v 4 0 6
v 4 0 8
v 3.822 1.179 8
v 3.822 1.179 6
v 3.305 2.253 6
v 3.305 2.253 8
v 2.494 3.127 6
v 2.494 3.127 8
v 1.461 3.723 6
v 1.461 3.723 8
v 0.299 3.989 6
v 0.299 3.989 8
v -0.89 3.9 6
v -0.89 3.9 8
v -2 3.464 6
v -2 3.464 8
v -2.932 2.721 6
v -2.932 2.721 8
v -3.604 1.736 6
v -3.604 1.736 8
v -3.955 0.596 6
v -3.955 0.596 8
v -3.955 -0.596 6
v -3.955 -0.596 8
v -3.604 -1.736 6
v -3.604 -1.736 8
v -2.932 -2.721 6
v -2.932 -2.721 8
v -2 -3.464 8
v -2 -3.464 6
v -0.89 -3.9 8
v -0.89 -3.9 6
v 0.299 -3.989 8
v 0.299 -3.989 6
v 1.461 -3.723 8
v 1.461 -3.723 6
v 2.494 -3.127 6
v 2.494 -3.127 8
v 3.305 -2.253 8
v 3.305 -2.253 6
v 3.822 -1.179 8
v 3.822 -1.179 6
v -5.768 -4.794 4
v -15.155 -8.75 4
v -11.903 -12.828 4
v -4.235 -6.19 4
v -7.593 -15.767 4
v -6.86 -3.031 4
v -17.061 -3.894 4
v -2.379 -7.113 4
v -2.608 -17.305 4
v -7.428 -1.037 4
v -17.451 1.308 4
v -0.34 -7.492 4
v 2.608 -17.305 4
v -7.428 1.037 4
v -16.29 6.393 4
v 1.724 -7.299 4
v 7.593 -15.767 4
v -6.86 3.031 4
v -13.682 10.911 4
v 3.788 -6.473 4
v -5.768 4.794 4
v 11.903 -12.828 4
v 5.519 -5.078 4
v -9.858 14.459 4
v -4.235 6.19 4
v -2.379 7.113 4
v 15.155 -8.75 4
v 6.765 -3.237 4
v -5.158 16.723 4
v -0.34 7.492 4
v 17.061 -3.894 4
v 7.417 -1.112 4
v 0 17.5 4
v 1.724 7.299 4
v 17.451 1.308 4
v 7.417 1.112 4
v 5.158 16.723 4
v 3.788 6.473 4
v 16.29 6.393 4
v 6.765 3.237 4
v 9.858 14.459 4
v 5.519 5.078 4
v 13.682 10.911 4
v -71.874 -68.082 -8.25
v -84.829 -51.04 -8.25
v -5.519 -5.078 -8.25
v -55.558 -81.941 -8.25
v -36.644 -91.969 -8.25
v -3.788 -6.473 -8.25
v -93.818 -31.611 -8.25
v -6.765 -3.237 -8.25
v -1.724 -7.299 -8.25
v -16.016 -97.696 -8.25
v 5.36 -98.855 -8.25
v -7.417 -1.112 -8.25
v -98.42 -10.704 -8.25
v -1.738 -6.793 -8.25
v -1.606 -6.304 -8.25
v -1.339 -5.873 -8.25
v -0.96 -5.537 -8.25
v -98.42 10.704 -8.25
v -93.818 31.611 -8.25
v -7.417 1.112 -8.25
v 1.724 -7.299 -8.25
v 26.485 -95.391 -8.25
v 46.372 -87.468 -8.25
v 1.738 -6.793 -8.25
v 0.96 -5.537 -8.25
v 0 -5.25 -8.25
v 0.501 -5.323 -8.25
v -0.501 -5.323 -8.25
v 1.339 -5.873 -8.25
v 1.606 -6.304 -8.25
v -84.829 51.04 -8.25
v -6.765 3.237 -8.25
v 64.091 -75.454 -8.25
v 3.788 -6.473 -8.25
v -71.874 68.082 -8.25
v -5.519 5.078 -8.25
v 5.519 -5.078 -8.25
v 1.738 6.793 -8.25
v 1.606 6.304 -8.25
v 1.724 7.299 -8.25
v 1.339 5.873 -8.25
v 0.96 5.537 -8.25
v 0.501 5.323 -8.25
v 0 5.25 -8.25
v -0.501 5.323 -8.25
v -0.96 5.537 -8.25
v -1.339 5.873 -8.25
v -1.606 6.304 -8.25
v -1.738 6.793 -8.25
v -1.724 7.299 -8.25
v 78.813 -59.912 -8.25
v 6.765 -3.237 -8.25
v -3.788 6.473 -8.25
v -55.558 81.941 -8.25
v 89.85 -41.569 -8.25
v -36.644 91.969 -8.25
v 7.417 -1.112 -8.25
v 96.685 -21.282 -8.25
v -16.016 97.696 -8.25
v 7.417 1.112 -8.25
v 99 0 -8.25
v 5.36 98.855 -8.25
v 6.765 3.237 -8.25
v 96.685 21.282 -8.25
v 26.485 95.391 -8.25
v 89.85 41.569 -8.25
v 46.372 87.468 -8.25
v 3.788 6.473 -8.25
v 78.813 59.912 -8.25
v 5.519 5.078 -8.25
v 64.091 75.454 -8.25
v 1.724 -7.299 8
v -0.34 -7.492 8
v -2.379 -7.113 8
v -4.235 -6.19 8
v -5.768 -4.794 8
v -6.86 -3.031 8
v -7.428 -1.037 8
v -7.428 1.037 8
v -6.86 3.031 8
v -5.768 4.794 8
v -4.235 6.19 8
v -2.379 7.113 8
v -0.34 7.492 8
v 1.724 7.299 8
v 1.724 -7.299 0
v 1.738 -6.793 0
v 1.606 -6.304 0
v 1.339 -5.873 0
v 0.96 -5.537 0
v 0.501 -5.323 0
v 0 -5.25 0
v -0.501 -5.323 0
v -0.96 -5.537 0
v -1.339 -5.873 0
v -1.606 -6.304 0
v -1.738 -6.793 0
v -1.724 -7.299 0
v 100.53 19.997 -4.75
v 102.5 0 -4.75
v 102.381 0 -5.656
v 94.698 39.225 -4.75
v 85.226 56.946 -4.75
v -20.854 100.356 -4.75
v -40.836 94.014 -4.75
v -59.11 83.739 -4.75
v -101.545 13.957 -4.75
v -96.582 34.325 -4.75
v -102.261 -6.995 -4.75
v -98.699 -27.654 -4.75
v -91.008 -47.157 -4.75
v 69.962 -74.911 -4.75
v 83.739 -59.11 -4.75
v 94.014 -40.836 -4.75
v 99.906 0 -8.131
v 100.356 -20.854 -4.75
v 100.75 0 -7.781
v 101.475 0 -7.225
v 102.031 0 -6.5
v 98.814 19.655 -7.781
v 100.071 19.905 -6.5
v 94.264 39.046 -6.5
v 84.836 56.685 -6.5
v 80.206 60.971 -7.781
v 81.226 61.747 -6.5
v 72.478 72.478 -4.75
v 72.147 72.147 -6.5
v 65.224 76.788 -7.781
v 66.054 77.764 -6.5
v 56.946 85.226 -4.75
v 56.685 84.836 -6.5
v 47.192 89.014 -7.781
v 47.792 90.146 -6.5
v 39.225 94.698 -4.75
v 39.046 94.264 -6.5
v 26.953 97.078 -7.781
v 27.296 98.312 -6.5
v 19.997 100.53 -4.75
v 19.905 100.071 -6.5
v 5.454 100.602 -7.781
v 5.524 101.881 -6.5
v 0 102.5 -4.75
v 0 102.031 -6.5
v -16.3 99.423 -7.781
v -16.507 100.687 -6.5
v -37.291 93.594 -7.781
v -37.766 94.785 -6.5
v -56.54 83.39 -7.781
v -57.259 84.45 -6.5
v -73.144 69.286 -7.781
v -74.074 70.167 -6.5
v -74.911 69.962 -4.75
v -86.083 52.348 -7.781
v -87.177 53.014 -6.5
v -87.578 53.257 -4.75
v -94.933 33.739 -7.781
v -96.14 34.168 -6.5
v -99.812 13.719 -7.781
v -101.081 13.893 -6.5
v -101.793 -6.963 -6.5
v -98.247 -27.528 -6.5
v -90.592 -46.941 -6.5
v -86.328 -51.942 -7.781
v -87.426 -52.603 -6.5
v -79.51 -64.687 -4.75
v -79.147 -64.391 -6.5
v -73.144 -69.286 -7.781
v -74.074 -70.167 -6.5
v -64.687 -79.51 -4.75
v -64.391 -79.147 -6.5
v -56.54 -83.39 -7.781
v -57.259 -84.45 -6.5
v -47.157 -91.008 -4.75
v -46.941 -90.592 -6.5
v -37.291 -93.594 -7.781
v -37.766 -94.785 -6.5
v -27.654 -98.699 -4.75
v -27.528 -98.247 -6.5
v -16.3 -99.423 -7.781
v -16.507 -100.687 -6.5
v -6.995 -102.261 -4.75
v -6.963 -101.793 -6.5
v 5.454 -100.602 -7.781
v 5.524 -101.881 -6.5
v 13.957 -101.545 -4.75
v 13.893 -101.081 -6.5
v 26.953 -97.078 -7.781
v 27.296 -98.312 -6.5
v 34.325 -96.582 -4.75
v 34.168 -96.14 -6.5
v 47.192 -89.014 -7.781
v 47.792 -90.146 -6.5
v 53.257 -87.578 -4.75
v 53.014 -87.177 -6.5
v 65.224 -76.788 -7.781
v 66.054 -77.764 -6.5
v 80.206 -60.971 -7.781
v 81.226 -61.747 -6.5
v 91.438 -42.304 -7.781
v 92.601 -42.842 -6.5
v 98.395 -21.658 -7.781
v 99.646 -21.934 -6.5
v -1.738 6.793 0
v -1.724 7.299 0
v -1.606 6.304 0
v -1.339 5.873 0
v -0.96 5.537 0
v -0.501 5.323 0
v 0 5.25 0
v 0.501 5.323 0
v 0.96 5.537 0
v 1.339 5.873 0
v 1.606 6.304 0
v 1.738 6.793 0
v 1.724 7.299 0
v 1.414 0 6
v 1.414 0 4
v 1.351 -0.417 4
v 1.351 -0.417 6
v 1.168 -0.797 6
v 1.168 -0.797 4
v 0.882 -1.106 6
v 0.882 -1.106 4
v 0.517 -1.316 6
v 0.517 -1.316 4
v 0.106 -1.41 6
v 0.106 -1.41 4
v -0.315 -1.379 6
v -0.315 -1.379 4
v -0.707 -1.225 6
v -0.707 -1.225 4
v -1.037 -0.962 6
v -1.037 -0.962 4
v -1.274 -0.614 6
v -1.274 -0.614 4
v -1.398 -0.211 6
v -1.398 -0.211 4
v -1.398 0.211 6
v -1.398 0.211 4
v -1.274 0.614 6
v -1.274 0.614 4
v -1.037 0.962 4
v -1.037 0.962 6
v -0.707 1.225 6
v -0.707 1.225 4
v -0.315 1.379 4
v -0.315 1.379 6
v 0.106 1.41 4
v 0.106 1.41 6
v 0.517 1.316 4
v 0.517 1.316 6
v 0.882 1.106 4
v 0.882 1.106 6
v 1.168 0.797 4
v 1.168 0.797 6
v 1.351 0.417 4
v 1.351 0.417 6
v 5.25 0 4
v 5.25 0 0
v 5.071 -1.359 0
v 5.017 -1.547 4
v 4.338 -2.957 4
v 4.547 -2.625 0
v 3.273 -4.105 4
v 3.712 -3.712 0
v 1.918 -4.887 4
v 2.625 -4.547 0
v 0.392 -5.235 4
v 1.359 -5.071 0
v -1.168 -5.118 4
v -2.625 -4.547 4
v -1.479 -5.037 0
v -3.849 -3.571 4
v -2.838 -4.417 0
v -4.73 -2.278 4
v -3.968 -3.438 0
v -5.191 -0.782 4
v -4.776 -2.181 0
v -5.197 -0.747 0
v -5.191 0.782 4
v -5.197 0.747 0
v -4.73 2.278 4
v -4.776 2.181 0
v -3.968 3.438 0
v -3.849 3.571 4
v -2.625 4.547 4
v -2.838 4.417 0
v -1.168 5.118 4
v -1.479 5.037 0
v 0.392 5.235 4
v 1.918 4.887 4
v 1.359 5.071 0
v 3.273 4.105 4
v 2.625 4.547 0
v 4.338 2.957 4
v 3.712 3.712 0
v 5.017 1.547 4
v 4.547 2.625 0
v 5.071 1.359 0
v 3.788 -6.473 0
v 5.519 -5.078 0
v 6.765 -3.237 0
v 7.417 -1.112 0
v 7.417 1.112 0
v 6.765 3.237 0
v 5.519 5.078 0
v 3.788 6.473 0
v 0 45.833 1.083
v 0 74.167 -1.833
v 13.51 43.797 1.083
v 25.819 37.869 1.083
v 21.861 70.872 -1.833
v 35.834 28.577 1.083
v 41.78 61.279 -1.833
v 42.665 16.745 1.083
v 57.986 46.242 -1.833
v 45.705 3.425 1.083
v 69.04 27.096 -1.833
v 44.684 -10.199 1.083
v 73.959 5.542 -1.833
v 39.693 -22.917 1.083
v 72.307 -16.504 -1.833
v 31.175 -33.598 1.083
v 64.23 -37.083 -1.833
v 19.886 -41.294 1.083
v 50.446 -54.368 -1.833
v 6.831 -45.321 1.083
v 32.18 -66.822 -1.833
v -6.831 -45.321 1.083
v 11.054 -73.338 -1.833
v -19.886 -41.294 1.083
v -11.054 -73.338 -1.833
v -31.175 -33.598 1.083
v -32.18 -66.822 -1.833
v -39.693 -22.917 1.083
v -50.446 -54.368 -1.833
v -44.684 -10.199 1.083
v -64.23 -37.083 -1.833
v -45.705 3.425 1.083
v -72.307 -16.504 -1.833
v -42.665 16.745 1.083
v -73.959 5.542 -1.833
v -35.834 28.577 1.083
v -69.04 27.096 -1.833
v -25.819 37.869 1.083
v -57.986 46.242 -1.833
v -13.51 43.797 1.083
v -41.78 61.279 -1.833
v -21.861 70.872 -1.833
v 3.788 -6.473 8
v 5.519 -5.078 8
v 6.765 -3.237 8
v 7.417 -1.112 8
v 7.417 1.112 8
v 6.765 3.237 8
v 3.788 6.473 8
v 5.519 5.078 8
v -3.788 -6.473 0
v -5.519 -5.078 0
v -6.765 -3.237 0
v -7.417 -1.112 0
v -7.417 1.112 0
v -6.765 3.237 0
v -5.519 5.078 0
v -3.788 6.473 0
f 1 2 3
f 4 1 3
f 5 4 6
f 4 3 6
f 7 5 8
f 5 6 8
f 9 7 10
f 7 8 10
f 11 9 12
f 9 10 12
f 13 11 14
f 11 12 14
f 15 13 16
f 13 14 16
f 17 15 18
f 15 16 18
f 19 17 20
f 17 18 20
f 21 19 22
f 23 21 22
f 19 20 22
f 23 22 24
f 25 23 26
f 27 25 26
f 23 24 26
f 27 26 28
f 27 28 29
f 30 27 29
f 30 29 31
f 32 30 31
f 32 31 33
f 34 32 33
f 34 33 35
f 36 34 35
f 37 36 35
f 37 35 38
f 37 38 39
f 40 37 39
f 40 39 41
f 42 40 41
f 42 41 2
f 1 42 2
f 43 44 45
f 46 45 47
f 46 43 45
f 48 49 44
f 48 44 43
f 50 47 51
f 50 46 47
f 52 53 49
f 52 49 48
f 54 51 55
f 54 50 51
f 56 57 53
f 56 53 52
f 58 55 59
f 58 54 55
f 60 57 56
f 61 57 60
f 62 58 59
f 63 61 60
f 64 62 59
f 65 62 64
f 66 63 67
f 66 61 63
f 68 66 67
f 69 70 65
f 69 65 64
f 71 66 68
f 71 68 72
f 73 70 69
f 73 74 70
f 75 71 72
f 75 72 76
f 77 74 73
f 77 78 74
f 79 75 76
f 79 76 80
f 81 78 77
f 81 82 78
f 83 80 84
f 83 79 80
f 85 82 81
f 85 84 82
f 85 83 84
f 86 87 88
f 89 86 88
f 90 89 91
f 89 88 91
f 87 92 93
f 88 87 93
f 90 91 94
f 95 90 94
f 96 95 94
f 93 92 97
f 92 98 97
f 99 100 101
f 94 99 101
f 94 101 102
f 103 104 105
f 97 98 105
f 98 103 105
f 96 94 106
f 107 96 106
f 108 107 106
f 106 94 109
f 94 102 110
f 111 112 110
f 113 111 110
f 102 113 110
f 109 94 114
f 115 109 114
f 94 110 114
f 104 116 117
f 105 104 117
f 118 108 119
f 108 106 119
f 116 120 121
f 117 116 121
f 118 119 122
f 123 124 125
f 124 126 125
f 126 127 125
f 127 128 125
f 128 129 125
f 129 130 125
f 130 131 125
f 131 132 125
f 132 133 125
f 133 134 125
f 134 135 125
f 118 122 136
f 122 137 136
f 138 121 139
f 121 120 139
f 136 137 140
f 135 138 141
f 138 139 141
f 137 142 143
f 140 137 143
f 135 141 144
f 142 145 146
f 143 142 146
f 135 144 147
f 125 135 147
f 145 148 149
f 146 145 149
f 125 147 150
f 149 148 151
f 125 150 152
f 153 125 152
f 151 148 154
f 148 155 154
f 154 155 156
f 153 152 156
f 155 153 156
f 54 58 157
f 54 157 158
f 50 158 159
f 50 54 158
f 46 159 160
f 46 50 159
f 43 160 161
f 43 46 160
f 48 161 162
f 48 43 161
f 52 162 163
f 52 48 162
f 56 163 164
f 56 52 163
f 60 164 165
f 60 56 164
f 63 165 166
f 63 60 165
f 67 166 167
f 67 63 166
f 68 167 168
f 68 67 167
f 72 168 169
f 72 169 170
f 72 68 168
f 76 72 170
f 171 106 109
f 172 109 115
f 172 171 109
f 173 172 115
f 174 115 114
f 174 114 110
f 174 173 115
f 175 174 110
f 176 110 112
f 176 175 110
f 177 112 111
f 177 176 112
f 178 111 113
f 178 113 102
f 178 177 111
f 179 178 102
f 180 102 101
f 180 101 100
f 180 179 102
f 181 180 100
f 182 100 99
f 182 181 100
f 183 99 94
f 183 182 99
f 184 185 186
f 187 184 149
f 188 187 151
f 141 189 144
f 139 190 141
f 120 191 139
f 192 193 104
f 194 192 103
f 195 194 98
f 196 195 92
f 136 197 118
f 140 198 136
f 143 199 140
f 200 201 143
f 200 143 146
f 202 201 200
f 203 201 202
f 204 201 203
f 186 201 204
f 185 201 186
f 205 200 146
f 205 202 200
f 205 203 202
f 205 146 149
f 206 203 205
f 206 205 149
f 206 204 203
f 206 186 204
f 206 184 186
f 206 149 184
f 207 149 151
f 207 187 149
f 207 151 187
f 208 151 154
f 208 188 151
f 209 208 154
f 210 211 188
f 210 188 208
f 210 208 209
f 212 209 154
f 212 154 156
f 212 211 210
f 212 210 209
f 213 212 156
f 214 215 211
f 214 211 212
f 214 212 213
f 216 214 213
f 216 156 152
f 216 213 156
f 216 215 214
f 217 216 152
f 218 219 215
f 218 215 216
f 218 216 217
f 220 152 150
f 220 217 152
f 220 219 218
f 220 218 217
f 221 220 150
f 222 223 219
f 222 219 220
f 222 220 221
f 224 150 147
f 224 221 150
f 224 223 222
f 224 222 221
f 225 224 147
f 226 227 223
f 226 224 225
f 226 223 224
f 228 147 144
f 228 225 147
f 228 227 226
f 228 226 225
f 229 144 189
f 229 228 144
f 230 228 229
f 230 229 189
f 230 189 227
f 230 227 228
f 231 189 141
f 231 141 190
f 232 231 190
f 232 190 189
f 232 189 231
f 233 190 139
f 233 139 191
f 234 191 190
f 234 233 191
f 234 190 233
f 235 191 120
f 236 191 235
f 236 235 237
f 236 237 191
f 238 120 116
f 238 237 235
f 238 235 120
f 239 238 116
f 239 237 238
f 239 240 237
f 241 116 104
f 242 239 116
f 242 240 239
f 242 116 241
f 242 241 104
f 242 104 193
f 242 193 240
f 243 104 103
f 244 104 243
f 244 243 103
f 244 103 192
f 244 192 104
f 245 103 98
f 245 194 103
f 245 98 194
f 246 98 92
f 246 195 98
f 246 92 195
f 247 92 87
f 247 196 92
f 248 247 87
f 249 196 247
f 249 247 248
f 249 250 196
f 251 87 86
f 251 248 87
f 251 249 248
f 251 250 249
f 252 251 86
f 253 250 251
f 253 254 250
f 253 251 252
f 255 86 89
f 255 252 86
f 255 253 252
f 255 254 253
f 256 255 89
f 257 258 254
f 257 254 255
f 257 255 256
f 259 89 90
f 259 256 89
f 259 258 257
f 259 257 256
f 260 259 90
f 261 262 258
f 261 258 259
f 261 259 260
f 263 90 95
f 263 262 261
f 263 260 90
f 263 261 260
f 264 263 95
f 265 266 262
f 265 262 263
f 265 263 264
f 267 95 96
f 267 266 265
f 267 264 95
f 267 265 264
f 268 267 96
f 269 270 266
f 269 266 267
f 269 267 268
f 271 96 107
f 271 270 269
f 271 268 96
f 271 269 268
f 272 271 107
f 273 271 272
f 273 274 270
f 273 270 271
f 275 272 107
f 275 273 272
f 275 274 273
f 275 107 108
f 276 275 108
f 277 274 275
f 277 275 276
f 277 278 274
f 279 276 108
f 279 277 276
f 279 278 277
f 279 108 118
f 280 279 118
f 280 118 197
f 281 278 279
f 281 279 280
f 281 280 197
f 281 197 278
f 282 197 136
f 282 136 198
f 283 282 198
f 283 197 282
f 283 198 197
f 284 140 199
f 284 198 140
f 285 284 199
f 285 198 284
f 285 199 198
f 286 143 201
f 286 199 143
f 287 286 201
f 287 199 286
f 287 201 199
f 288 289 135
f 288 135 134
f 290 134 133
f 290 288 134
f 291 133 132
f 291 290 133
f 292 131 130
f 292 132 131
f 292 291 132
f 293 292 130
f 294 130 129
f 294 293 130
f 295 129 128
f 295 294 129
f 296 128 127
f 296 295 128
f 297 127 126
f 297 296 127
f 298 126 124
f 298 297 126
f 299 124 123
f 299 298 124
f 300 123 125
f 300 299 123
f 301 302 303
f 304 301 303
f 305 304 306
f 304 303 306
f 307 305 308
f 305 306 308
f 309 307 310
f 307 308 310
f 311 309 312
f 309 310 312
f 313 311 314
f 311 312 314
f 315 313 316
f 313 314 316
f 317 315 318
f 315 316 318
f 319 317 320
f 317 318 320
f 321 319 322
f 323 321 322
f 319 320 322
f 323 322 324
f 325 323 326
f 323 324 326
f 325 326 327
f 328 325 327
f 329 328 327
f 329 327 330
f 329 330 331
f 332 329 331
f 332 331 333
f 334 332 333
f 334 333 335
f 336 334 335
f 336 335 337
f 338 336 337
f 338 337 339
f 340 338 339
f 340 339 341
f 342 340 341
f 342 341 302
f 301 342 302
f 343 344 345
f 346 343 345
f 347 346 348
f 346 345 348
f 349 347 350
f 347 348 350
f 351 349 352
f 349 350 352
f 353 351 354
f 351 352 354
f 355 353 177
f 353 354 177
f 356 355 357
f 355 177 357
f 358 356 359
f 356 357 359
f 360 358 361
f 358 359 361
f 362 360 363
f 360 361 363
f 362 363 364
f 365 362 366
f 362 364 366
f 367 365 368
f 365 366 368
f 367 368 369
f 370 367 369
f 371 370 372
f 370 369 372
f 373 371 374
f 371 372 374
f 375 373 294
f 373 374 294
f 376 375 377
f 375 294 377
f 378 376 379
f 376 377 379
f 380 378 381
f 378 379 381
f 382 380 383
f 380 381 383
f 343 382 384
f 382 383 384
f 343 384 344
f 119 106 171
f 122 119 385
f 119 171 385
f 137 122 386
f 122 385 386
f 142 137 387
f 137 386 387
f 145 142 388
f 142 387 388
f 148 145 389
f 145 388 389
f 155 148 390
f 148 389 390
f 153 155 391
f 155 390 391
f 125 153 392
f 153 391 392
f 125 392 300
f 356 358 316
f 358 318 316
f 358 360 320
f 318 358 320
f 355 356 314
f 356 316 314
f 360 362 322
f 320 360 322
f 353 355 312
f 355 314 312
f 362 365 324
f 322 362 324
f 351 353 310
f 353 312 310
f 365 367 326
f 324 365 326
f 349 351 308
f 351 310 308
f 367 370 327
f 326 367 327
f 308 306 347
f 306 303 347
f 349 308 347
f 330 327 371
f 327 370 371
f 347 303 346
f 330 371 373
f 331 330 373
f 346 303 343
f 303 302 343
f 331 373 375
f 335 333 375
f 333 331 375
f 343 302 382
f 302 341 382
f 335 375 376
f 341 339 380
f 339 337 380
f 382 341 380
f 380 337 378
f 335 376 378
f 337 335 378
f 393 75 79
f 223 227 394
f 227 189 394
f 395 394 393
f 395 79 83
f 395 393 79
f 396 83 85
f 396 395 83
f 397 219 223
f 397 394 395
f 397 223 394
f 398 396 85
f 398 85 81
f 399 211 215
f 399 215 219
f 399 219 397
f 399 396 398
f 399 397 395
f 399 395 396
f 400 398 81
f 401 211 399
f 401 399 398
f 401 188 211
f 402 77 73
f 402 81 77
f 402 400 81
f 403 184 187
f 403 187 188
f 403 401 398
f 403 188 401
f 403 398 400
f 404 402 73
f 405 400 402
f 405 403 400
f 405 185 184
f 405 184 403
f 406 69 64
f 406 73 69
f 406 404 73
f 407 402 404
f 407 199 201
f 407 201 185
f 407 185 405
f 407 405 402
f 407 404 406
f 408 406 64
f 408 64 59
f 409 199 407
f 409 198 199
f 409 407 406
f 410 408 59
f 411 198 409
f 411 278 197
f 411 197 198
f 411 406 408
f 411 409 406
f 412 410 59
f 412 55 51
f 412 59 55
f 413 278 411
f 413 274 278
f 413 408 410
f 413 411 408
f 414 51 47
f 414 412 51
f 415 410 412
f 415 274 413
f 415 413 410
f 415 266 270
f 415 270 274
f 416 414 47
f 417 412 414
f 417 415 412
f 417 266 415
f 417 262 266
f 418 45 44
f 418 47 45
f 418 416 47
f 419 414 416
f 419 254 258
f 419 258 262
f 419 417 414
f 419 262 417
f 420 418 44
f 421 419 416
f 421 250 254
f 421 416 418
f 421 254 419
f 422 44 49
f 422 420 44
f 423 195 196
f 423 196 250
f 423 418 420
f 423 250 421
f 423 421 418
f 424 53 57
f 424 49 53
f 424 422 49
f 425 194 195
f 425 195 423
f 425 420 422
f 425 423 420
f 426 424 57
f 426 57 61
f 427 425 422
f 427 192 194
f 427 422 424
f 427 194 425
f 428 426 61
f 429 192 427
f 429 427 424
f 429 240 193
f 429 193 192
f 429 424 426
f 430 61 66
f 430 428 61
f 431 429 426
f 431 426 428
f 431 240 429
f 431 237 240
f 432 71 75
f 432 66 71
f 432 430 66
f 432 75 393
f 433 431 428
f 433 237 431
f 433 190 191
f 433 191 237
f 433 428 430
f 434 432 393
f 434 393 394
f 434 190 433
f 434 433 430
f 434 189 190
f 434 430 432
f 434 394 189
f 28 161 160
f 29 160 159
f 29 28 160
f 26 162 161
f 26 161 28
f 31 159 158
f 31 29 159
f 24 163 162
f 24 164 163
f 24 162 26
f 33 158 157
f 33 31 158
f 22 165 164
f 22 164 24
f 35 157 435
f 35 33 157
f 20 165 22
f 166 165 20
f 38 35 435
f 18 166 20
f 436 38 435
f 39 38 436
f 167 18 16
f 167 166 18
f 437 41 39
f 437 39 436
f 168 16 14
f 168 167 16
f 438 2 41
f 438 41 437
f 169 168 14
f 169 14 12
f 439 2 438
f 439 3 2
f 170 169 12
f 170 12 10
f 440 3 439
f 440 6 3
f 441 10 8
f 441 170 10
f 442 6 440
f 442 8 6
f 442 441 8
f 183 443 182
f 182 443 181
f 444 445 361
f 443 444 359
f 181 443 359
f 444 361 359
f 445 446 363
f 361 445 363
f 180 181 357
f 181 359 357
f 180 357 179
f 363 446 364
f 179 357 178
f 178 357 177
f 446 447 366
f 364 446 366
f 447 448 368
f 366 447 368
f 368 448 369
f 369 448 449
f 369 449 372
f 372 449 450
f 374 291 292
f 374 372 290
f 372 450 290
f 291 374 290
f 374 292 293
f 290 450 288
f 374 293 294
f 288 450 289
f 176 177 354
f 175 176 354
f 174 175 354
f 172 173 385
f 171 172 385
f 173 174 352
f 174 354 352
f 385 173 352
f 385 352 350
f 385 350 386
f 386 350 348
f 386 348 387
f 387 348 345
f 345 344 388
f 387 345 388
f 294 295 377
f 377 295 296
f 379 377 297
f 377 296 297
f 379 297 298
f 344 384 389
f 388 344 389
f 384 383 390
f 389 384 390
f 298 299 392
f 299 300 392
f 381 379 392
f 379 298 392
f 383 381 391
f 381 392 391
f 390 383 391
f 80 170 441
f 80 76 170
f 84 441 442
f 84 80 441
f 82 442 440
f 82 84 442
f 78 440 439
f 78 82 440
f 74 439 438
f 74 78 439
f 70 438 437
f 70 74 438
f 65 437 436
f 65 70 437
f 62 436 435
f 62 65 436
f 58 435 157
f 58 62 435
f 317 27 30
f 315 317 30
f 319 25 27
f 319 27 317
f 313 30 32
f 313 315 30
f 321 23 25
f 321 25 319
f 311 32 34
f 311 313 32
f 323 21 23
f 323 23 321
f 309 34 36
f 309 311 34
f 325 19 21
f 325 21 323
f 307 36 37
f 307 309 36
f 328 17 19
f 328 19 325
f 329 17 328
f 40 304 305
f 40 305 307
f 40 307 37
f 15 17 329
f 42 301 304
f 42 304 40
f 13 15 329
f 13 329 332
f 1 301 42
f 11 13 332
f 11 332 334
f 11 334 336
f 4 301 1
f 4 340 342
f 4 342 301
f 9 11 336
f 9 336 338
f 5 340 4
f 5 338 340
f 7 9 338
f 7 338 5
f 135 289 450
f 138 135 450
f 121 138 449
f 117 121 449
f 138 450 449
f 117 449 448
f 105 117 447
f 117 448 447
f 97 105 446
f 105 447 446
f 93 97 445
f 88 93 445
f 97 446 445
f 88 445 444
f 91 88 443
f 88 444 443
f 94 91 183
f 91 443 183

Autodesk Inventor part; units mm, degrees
ref_plane "YZ Plane" through (0, 0, 0) normal (1, 0, 0) x (0, 1, 0)
ref_plane "XZ Plane" through (0, 0, 0) normal (0, 1, 0) x (-1, 0, 0)
ref_plane "XY Plane" through (0, 0, 0) normal (0, 0, 1) x (1, 0, 0)
sketch "Sketch1" plane through (0, 0, 0) normal (0, 0, 1) x (1, 0, 0)
  arc A0 (-1.9795, 6.7143) -> (1.9795, 6.7143) centre (0, 7) ccw
  arc A1 (-1.9795, 6.7143) -> (-1.9795, -6.7143) centre (0, 0) ccw
  arc A2 (1.9795, -6.7143) -> (-1.9795, -6.7143) centre (0, -7) ccw
  arc A3 (1.9795, -6.7143) -> (1.9795, 6.7143) centre (0, 0) ccw
  line L0 (3.6, 1.9621) -> (3.6, -1.9621)
  arc A4 (3.6, 1.9621) -> (3.6, -1.9621) centre (0, 0) ccw
  circle A5 centre (0, -7) radius 1.75
  circle A6 centre (0, 7) radius 1.75
  circle A7 centre (0, 0) radius 7.5
  circle A8 centre (0, 0) radius 102.5
  point P0 (0, 0)
  point P1 (-1.7242, 7.2991)
  point P2 (1.7242, 7.2991)
  point P3 (1.7242, -7.2991)
  point P4 (-1.7242, -7.2991)
  dimension "d0" = 3.5
  dimension "d1" = 3.5
  dimension "d2" = 15
  dimension "d3" = 205
extrude "Extrusion1" add sketch "Sketch1" against normal blind 8.25 contours A5 A7 | A7 A5 | A7 A6 | A6 A7 | A8
fillet "Fillet1" radius 3.5 1 edges at (-102.5, 0, -8.25)
sketch "Sketch2" plane through (0, 0, 0) normal (0, 0, 1) x (1, 0, 0)
  circle A0 centre (0, 0) radius 5.25
  arc A1 (1.7242, -7.2991) -> (-1.7242, -7.2991) centre (0, -7) ccw
  circle A2 centre (0, 0) radius 10
  circle A3 centre (0, 0) radius 102.5
  dimension "d7" = 20
extrude "Extrusion2" add sketch "Sketch2" along normal blind 4 contours A2 | A3
sketch "Sketch3" plane through (0, 0, 4) normal (0, 0, 1) x (1, 0, 0)
  circle A0 centre (0, 0) radius 5.25
  arc A1 (1.7242, -7.2991) -> (1.7242, 7.2991) centre (0, 0) ccw
  circle A2 centre (0, 0) radius 1.4142
  circle A3 centre (0, 0) radius 3.6056
  arc A4 (0, -5.25) -> (0, 5.25) centre (0, 0) ccw
  arc A5 (1.7242, -7.2991) -> (1.7242, 7.2991) centre (0, 0) ccw
  circle A6 centre (0, 0) radius 7.5
  point P0 (1.7242, 7.2991)
extrude "Extrusion3" add sketch "Sketch3" along normal blind 4 contours A0 | A6 A1 | A3
sketch "Sketch4" plane through (0, 0, 8) normal (0, 0, 1) x (1, 0, 0)
  circle A0 centre (0, 0) radius 4
extrude "Extrusion4" cut sketch "Sketch4" against normal blind 2
sketch "Sketch5" plane through (0, 0, 0) normal (1, 0, 0) x (0, 1, 0)
  line L0 (102.5, 4) -> (-102.5, 4)
  line L1 (-102.5, -4.75) -> (102.5, -4.75)
  line L2 (7.5, 8) -> (-7.5, 8)
  line L3 (-7.5, 4) -> (7.5, 4)
  line L4 (7.5, 4) -> (17.5, 4)
  line L5 (17.5, 4) -> (102.5, -4.75)
  line L6 (102.5, -4.75) -> (102.5, 16)
  line L7 (102.5, 16) -> (7.5, 16)
  line L8 (7.5, 16) -> (7.5, 4)
  line L9 (0, -13.1) -> (0, 20.85) projected
  point P0 (0, 0)
  dimension "d14" = 10
revolve "Revolution1" cut sketch "Sketch5" angle 360 about axis through (0, 0, -10) along (0, 0, 1) contours L6 L5 L0 | L0 L8 L7 L6
properties part number "center_disk"
